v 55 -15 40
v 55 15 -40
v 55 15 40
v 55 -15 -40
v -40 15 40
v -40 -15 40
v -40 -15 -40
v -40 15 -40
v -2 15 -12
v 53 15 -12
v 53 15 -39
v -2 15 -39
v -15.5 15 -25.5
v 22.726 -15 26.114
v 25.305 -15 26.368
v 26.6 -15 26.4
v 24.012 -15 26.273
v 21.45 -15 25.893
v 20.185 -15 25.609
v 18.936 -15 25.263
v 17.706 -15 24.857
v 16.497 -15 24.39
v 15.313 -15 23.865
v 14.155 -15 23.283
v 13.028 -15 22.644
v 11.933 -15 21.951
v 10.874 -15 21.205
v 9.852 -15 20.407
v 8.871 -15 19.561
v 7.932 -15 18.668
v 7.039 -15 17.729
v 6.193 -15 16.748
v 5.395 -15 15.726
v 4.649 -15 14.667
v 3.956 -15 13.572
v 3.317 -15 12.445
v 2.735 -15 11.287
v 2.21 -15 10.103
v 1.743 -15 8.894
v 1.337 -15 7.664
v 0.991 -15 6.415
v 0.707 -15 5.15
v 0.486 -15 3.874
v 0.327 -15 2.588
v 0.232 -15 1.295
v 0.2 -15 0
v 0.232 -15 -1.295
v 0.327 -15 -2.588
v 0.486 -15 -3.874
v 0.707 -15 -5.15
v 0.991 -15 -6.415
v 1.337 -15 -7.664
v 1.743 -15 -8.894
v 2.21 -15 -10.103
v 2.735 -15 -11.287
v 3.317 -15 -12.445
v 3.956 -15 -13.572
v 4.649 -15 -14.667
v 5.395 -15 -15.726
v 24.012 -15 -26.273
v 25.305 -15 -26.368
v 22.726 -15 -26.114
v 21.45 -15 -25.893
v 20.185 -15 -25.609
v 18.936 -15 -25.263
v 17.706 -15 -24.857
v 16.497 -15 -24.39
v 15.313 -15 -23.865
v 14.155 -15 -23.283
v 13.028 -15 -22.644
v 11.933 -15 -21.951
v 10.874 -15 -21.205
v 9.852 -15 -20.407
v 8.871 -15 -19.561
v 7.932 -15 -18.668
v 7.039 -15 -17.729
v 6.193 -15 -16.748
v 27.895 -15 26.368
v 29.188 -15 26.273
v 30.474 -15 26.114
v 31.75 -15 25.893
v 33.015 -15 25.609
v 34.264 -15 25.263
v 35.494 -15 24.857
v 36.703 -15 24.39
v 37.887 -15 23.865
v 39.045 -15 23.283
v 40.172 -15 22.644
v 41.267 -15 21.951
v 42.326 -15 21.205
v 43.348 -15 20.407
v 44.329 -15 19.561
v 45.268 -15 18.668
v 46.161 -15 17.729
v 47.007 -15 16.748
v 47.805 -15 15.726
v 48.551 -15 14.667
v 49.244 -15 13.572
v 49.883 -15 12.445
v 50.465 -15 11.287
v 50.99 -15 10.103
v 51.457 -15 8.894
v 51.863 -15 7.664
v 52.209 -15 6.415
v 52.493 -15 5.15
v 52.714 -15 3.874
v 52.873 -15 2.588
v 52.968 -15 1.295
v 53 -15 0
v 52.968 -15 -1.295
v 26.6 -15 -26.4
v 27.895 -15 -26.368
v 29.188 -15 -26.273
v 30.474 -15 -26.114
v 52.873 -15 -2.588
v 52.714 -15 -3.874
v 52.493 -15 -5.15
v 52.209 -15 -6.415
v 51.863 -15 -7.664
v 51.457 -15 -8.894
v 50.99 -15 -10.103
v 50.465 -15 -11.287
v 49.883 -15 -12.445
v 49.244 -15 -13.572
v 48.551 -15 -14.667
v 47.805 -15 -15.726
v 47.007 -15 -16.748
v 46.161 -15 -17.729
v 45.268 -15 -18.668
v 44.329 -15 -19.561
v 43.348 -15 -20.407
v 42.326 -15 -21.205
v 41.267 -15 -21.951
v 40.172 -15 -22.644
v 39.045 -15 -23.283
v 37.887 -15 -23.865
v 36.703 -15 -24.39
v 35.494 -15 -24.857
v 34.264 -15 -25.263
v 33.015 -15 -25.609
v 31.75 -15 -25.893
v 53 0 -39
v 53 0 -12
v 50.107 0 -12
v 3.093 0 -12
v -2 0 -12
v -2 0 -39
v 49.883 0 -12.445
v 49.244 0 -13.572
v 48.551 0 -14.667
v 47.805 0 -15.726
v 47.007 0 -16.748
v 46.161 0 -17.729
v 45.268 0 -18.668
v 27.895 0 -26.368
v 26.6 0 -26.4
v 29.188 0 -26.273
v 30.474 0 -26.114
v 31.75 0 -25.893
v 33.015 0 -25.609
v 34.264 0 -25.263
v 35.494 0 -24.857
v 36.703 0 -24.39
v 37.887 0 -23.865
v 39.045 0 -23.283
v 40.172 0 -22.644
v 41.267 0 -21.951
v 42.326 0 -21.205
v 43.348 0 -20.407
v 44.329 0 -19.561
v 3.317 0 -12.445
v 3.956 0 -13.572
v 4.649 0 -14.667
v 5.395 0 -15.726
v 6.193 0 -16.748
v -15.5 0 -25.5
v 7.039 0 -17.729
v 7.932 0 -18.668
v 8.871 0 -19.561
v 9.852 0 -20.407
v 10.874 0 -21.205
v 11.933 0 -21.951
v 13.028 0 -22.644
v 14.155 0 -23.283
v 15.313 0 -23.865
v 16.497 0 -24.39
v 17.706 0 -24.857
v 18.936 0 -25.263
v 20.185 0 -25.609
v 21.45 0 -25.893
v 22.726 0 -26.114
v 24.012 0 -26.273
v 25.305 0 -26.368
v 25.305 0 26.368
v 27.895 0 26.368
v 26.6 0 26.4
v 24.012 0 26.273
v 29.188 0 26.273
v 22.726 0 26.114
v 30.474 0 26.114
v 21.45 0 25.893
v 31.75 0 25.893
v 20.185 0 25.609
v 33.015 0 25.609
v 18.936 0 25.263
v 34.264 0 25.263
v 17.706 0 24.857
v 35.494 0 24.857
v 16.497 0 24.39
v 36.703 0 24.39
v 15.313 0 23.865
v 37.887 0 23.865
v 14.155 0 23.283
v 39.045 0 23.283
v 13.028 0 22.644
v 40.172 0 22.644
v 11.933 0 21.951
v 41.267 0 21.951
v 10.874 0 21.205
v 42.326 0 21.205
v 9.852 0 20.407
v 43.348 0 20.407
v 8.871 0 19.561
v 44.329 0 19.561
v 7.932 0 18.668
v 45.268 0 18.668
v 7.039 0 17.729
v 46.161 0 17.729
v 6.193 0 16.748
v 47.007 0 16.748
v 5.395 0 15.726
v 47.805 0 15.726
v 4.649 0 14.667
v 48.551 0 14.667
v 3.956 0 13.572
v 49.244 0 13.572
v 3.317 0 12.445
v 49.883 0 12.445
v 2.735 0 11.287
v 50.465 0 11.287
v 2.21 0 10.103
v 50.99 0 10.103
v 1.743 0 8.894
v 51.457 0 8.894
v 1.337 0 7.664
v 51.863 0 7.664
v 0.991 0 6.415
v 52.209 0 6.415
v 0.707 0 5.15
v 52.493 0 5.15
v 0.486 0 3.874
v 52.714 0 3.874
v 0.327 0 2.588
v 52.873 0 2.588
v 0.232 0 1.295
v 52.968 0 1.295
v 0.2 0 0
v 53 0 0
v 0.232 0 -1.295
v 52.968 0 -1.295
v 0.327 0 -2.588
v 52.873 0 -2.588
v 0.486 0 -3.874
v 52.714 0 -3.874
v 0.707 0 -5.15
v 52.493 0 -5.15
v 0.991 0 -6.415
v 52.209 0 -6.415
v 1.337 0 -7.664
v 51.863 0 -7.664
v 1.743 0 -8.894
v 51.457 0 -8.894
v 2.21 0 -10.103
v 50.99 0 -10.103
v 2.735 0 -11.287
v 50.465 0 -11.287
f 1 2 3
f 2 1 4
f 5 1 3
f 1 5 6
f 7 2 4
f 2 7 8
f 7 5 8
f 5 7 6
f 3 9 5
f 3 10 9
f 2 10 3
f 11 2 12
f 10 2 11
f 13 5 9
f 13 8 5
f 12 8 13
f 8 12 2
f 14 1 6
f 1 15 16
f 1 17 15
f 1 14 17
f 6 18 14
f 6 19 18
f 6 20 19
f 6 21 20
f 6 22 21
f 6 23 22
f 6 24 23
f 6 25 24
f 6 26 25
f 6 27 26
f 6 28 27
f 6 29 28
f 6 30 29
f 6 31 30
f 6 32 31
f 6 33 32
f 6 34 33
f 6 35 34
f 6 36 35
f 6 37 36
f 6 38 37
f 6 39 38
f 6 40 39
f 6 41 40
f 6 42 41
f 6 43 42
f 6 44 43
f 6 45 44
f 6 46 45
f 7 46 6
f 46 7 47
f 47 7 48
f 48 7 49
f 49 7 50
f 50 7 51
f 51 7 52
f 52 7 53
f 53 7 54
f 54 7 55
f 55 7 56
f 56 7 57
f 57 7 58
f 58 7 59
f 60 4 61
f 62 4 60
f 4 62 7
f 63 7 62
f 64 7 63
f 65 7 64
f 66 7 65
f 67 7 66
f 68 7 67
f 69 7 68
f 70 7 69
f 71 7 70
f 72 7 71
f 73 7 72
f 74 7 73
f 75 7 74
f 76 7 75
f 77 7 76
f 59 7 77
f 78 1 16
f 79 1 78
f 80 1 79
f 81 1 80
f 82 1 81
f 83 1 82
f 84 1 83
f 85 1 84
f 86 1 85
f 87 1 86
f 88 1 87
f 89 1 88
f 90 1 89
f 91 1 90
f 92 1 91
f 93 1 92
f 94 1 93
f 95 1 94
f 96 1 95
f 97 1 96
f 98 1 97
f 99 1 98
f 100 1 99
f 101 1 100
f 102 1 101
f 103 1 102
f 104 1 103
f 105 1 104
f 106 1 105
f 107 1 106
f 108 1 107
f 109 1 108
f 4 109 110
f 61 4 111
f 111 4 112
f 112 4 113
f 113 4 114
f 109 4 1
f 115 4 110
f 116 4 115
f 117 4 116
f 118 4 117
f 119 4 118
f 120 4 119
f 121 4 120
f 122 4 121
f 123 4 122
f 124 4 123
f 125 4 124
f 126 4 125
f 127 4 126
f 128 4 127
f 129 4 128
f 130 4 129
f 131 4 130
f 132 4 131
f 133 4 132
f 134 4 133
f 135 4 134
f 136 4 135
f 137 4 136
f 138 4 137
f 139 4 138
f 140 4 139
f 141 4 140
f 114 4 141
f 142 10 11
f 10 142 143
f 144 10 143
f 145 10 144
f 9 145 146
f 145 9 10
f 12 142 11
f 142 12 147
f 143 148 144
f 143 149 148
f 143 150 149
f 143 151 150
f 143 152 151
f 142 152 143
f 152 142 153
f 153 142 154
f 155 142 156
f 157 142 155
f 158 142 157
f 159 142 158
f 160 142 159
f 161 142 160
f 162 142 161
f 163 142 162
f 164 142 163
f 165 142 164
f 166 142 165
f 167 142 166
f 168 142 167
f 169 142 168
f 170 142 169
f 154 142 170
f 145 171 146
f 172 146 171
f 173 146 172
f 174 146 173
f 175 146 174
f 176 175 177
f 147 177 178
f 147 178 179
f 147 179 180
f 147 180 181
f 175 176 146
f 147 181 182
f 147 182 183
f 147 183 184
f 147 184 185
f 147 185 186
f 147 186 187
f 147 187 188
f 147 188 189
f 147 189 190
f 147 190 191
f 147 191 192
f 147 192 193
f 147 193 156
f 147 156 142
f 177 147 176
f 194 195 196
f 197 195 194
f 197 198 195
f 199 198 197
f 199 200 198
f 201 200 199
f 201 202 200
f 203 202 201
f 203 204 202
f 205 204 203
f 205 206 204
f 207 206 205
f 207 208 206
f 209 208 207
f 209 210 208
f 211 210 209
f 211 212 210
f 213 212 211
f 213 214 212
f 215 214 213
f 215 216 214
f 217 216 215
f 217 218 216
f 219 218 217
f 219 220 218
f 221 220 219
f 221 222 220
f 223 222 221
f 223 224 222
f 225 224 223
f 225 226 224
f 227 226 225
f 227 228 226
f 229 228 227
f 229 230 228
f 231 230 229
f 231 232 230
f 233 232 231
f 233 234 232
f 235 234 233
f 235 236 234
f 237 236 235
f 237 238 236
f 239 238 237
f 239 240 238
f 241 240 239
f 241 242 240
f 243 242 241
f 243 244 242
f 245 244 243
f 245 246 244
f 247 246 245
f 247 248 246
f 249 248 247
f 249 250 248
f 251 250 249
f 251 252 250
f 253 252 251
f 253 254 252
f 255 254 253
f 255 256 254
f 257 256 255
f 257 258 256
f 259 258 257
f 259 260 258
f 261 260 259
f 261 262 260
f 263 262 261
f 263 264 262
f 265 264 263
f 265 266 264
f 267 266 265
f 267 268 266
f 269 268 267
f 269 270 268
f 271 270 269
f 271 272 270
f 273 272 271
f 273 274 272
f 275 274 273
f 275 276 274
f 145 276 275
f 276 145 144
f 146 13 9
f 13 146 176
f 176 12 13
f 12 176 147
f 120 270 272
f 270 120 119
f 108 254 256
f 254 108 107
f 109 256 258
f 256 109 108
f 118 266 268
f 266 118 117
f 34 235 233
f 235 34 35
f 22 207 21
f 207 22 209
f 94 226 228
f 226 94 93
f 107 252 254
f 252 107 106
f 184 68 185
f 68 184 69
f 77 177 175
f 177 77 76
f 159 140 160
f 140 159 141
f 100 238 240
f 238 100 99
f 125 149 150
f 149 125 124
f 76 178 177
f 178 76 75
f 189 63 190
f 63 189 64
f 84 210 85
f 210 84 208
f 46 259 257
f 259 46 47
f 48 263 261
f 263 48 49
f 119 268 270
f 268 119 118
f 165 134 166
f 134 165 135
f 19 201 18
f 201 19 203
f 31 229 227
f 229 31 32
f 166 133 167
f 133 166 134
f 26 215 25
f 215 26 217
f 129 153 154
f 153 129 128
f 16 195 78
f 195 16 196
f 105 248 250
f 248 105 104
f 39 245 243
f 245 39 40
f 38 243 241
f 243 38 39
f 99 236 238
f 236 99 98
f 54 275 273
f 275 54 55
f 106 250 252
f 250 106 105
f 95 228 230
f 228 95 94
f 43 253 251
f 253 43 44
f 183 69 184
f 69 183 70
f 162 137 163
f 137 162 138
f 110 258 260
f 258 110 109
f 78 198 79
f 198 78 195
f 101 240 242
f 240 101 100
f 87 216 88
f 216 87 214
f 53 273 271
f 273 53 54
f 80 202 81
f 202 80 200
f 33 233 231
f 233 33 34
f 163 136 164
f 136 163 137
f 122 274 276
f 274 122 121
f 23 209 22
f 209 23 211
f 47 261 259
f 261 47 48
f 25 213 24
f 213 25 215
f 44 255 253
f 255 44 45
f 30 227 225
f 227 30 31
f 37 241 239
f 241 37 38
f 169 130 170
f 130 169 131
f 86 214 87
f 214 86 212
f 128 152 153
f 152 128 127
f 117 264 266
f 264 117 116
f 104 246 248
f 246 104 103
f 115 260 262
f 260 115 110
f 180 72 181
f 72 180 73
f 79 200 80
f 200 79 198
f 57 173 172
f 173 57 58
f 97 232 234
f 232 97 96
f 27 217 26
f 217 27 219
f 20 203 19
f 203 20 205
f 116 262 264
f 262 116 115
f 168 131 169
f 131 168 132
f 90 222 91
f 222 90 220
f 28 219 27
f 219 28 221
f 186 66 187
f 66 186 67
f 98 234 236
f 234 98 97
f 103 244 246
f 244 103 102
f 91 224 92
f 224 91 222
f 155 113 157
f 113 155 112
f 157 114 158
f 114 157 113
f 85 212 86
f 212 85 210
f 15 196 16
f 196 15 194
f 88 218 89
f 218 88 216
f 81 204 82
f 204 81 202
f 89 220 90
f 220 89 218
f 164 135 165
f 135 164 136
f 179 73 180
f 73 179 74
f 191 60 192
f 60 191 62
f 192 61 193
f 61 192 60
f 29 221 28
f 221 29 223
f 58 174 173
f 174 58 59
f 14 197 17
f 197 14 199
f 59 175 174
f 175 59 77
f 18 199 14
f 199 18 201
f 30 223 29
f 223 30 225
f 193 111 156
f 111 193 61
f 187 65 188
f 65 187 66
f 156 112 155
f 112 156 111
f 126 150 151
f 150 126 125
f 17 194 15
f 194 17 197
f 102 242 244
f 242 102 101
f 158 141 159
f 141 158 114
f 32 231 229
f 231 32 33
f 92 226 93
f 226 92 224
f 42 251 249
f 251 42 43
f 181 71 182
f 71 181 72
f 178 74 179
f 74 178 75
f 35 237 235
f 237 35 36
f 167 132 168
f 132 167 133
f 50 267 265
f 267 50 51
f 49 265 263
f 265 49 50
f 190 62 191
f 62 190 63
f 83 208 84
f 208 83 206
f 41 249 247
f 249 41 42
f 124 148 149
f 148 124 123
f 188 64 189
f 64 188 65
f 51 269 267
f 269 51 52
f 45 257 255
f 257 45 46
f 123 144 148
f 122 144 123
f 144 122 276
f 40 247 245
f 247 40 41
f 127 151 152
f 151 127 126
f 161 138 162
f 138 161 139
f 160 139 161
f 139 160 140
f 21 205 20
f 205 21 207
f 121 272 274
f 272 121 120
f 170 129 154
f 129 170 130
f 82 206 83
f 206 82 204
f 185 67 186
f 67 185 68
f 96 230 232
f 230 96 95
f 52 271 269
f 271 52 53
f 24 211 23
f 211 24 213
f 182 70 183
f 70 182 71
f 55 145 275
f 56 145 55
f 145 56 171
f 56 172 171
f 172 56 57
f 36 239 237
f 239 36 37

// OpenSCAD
// file: ../mscrew/knurlpocket.scad
//Module to create a knurl pocket suitable for Heat-set inserts

// Articles about knurl insert
//https://hackaday.com/2019/02/28/threading-3d-printed-parts-how-to-use-heat-set-inserts/
//https://clevercreations.org/brass-threaded-inserts-plastic-3d-printing/

//Global vars
$fa = 1;
$fs = 0.2;
function knurl_radius(M=5) = 
    (M==5) ? 3.3 : 
    (M==4) ? 2.8 : 
    (M==3) ? 2.5 : 
    (M==2) ? 1.5 : 
    0;
function knurl_wall(M=5) = 
    (M==5) ? 3.5 : 
    (M==4) ? 3.0 : 
    (M==3) ? 2.5 :
    (M==2) ? 2.5 :
    0;


module Mknurl_ring(knurl_depth = 5, Msize=5)
{

    difference() {   
        cylinder(h=knurl_depth, r=knurl_radius(Msize)+knurl_wall(Msize),center=true);
        Mknurl_pocket(knurl_depth, Msize);
    }
    
}

module Mknurl_pocket(knurl_depth = 5,Msize=5)
{
 union() {
    cylinder(h=knurl_depth+0.001, r=knurl_radius(Msize), center=true);
    translate([0,0,0.4*knurl_depth])
        cylinder(h=0.25 * knurl_depth, r1=knurl_radius(Msize), r2=1.2*knurl_radius(Msize), center=true);
 }
}

Mknurl_ring(5,4);
// file: controller.scad
use <outlet.scad>
use <../mscrew/knurlpocket.scad>

function wallThickness()=1;
function controllerHeight()=27;


thickness=wallThickness();
height=controllerHeight();
oozeMargin=0.2;
 
module right_angle_prism(l, w, h) {
    linear_extrude(height = h) {
        polygon(points=[[0,0],[l,0],[0,w]], paths=[[0,1,2]]);
    }
}


module controller(
    depth=65
)
{
    width=70+2*(thickness+oozeMargin);
    tabWidth=15;
    tabThick=3;
    lip=5;
    
    difference() 
    {
        union()
        {
            cube([depth,width,height],center=true);
        }
        translate([-thickness,0,thickness])cube([depth,width-2*thickness,height],center=true);
        translate([-depth/2+tabWidth/2,-width/2,0])cube([tabWidth,tabThick,height+lip*2],center=true);

        inX=depth/2;
        inZ=height;
        translate([inX/2-2*thickness,-width/2,-height/2+inZ/2+thickness])cube([inX,width,inZ],center=true);

        translate([-2*thickness,-width/2,-height/2+inZ/2+thickness])rotate([0,45,0])cube([inZ*sqrt(2)/2,width,inZ*sqrt(2)/2],center=true);
    }

    knurlDepth=10;
    
    difference() {
    // Hacks to provide space for the tab
        union() {
            translate([-depth/2,width/2,-height/2])rotate([90,0,0])right_angle_prism(height,height, width-tabThick);
        translate([-depth/2+tabWidth/2+thickness,-width/2+tabThick+thickness/2,0])cube([tabWidth+2*    thickness,thickness,height],center=true);
        translate([-depth/2+tabWidth+tabThick/2,-width/2+tabThick/2,0])cube([tabThick,tabThick,height],center=true);
        }
        
    // knurl hole   
    translate([-depth/2+6.5,-width/2+knurlDepth/2+tabThick,height/2-15])rotate([90,0,0])Mknurl_pocket(knurlDepth,4);
    }

    //lips
    translate([tabWidth/2,-width/2+thickness/2,height/2+lip/2])cube([depth-tabWidth,thickness+0.01,lip],center=true);
    translate([0,width/2-thickness/2,height/2+lip/2])cube([depth,thickness,lip],center=true);
}

difference()
{
controller(80);
    //translate([0,30,0])cube([100,100,100],center=true);
    //translate([50,0,0])cube([100,100,100],center=true);
    //translate([34,0,50])cube([100,100,100],center=true);
    //translate([-20,0,0])cube([100,100,100],center=true);
}
// file: outlet.scad
thickness=1;

function ringHeight() = 20;
function outerD() = 54.8;
function outletD()= outerD()-2*thickness;

module budOutlet()
{

    notchX=6;
    notchY=1;
    notchz=1.6;
    notchOffset=ringHeight()/2-5;
    
    
    difference()
    {
        cylinder(h=ringHeight(),d=outerD(),center=true, $fn=128);
        cylinder(h=ringHeight(),d=outletD(),center=true, $fn=128);       
    }
    translate([0,outerD()/2-thickness/2,notchOffset])cube([notchX,thickness,notchz],center=true);
    translate([0,outerD()/2+notchY/2,notchOffset])cube([notchX,notchY,notchz],center=true);

    translate([0,-outerD()/2+thickness/2,notchOffset])cube([notchX,thickness,notchz],center=true);
    translate([0,-outerD()/2-notchY/2,notchOffset])cube([notchX,notchY,notchz],center=true);
}



module louveredOutlet()
{
    tabringD=54.5;
    tabThick=1;
    tubeD = 51;
    tubeHeight = ringHeight();
    innerD = tubeD-2*thickness;
    narrowHeight=5;
    difference()
    {
        union()
        {
            // tab ring
            translate([0,0,-tubeHeight/2+tabThick/2])cylinder(h=tabThick,d=tabringD,center=true, $fn=128);
            //match standard ring, not needed but nice
            translate([0,0,(tubeHeight-narrowHeight)/2])cylinder(h=tubeHeight-narrowHeight,d=outerD(),center=true,$fn=128);
            // The main tube
            cylinder(h=tubeHeight,d=tubeD,center=true, $fn=128);
        }
        cylinder(h=tubeHeight,d=innerD,center=true, $fn=128);
        translate([0,0,-tubeHeight/2+tabThick/2])cube([tabringD,20,tabThick],center=true);
    }
}


module outlet(style="bud")
{
    if (style=="bud")
        budOutlet();
    else
        louveredOutlet();
}

outlet();
// main file
use <outlet.scad>
use <controller.scad>


thickness=wallThickness();
height=controllerHeight();


module ductAngleTop(length=20,ductHeight=27,ductDepth=65)
{
    angleRight=(ductHeight-thickness/2);
    angleSide=angleRight*sqrt(2);

    difference() 
    {
        
        cube([ductDepth,length,ductHeight],center=true);  
        cube([ductDepth-2*thickness,length-2*thickness,ductHeight-2*thickness],center=true);

        //back wall at 45 angle
      translate([-ductDepth/2-ductHeight/2,length/2,-ductHeight/2])rotate([90,0,0])right_angle_prism(ductHeight,ductHeight, length);
    translate([-ductDepth/2-ductHeight/2,length/2,ductHeight/2])rotate([90,90,0])right_angle_prism(ductHeight,ductHeight, length);
  }

   difference()
   {
        union()
        {
            translate([-ductDepth/2,0,0])rotate([0,-45,0])cube([thickness,length,angleSide],center=true);
            translate([-ductDepth/2,0,0])rotate([0,45,0])cube([thickness,length,angleSide],center=true);
        }
        
   translate([-ductDepth/2-angleRight/4+thickness/2,0,0])cube([angleRight/2,length,ductHeight+thickness],center=true);
   translate([-ductDepth/2-angleRight/4-thickness,0,0])cube([angleRight/2,length,ductHeight+thickness],center=true);
   }
    
}

module ductFlatTop(length=20,ductHeight=27,ductDepth=65)
{
    angleRight=(ductHeight-thickness/2);
    angleSide=angleRight*sqrt(2);
    assert(length<=35,"Length is to large to bridge");
    tabCut=15;

    translate([tabCut/2,0,0])cube([ductDepth-tabCut,length,ductHeight],center=true);   
  }
   

module duct(
    length=20,
    ductHeight=27,
    outX=30,
    outZ=0,
    ductDepth=65,
    top="flat"
    )
{
    difference()
    {
        if(top=="flat")
            ductFlatTop(length,ductHeight,ductDepth);
        else    
            ductAngleTop(length,ductHeight,ductDepth);
        
        inX=ductDepth/2;
        inZ=height;
        translate([inX/2-2*thickness,length/2,-ductHeight/2+inZ/2+thickness])cube([inX,length,inZ],center=true);
        
        translate([-2*thickness,length/2,-ductHeight/2+inZ/2+thickness])rotate([0,45,0])cube([inZ*sqrt(2)/2,length,inZ*sqrt(2)/2],center=true);
        
        //outlet
        translate([outX,-length/2,outZ])rotate([90,0,0])cylinder(h=length,d=outletD(),center=true, $fn=128);
    }
    

}

duct(length=30,ductHeight=80,ductDepth=110,outX=55-outletD()/2-2);
//ductFlatTop(length=20,ductHeight=27,ductDepth=65);
